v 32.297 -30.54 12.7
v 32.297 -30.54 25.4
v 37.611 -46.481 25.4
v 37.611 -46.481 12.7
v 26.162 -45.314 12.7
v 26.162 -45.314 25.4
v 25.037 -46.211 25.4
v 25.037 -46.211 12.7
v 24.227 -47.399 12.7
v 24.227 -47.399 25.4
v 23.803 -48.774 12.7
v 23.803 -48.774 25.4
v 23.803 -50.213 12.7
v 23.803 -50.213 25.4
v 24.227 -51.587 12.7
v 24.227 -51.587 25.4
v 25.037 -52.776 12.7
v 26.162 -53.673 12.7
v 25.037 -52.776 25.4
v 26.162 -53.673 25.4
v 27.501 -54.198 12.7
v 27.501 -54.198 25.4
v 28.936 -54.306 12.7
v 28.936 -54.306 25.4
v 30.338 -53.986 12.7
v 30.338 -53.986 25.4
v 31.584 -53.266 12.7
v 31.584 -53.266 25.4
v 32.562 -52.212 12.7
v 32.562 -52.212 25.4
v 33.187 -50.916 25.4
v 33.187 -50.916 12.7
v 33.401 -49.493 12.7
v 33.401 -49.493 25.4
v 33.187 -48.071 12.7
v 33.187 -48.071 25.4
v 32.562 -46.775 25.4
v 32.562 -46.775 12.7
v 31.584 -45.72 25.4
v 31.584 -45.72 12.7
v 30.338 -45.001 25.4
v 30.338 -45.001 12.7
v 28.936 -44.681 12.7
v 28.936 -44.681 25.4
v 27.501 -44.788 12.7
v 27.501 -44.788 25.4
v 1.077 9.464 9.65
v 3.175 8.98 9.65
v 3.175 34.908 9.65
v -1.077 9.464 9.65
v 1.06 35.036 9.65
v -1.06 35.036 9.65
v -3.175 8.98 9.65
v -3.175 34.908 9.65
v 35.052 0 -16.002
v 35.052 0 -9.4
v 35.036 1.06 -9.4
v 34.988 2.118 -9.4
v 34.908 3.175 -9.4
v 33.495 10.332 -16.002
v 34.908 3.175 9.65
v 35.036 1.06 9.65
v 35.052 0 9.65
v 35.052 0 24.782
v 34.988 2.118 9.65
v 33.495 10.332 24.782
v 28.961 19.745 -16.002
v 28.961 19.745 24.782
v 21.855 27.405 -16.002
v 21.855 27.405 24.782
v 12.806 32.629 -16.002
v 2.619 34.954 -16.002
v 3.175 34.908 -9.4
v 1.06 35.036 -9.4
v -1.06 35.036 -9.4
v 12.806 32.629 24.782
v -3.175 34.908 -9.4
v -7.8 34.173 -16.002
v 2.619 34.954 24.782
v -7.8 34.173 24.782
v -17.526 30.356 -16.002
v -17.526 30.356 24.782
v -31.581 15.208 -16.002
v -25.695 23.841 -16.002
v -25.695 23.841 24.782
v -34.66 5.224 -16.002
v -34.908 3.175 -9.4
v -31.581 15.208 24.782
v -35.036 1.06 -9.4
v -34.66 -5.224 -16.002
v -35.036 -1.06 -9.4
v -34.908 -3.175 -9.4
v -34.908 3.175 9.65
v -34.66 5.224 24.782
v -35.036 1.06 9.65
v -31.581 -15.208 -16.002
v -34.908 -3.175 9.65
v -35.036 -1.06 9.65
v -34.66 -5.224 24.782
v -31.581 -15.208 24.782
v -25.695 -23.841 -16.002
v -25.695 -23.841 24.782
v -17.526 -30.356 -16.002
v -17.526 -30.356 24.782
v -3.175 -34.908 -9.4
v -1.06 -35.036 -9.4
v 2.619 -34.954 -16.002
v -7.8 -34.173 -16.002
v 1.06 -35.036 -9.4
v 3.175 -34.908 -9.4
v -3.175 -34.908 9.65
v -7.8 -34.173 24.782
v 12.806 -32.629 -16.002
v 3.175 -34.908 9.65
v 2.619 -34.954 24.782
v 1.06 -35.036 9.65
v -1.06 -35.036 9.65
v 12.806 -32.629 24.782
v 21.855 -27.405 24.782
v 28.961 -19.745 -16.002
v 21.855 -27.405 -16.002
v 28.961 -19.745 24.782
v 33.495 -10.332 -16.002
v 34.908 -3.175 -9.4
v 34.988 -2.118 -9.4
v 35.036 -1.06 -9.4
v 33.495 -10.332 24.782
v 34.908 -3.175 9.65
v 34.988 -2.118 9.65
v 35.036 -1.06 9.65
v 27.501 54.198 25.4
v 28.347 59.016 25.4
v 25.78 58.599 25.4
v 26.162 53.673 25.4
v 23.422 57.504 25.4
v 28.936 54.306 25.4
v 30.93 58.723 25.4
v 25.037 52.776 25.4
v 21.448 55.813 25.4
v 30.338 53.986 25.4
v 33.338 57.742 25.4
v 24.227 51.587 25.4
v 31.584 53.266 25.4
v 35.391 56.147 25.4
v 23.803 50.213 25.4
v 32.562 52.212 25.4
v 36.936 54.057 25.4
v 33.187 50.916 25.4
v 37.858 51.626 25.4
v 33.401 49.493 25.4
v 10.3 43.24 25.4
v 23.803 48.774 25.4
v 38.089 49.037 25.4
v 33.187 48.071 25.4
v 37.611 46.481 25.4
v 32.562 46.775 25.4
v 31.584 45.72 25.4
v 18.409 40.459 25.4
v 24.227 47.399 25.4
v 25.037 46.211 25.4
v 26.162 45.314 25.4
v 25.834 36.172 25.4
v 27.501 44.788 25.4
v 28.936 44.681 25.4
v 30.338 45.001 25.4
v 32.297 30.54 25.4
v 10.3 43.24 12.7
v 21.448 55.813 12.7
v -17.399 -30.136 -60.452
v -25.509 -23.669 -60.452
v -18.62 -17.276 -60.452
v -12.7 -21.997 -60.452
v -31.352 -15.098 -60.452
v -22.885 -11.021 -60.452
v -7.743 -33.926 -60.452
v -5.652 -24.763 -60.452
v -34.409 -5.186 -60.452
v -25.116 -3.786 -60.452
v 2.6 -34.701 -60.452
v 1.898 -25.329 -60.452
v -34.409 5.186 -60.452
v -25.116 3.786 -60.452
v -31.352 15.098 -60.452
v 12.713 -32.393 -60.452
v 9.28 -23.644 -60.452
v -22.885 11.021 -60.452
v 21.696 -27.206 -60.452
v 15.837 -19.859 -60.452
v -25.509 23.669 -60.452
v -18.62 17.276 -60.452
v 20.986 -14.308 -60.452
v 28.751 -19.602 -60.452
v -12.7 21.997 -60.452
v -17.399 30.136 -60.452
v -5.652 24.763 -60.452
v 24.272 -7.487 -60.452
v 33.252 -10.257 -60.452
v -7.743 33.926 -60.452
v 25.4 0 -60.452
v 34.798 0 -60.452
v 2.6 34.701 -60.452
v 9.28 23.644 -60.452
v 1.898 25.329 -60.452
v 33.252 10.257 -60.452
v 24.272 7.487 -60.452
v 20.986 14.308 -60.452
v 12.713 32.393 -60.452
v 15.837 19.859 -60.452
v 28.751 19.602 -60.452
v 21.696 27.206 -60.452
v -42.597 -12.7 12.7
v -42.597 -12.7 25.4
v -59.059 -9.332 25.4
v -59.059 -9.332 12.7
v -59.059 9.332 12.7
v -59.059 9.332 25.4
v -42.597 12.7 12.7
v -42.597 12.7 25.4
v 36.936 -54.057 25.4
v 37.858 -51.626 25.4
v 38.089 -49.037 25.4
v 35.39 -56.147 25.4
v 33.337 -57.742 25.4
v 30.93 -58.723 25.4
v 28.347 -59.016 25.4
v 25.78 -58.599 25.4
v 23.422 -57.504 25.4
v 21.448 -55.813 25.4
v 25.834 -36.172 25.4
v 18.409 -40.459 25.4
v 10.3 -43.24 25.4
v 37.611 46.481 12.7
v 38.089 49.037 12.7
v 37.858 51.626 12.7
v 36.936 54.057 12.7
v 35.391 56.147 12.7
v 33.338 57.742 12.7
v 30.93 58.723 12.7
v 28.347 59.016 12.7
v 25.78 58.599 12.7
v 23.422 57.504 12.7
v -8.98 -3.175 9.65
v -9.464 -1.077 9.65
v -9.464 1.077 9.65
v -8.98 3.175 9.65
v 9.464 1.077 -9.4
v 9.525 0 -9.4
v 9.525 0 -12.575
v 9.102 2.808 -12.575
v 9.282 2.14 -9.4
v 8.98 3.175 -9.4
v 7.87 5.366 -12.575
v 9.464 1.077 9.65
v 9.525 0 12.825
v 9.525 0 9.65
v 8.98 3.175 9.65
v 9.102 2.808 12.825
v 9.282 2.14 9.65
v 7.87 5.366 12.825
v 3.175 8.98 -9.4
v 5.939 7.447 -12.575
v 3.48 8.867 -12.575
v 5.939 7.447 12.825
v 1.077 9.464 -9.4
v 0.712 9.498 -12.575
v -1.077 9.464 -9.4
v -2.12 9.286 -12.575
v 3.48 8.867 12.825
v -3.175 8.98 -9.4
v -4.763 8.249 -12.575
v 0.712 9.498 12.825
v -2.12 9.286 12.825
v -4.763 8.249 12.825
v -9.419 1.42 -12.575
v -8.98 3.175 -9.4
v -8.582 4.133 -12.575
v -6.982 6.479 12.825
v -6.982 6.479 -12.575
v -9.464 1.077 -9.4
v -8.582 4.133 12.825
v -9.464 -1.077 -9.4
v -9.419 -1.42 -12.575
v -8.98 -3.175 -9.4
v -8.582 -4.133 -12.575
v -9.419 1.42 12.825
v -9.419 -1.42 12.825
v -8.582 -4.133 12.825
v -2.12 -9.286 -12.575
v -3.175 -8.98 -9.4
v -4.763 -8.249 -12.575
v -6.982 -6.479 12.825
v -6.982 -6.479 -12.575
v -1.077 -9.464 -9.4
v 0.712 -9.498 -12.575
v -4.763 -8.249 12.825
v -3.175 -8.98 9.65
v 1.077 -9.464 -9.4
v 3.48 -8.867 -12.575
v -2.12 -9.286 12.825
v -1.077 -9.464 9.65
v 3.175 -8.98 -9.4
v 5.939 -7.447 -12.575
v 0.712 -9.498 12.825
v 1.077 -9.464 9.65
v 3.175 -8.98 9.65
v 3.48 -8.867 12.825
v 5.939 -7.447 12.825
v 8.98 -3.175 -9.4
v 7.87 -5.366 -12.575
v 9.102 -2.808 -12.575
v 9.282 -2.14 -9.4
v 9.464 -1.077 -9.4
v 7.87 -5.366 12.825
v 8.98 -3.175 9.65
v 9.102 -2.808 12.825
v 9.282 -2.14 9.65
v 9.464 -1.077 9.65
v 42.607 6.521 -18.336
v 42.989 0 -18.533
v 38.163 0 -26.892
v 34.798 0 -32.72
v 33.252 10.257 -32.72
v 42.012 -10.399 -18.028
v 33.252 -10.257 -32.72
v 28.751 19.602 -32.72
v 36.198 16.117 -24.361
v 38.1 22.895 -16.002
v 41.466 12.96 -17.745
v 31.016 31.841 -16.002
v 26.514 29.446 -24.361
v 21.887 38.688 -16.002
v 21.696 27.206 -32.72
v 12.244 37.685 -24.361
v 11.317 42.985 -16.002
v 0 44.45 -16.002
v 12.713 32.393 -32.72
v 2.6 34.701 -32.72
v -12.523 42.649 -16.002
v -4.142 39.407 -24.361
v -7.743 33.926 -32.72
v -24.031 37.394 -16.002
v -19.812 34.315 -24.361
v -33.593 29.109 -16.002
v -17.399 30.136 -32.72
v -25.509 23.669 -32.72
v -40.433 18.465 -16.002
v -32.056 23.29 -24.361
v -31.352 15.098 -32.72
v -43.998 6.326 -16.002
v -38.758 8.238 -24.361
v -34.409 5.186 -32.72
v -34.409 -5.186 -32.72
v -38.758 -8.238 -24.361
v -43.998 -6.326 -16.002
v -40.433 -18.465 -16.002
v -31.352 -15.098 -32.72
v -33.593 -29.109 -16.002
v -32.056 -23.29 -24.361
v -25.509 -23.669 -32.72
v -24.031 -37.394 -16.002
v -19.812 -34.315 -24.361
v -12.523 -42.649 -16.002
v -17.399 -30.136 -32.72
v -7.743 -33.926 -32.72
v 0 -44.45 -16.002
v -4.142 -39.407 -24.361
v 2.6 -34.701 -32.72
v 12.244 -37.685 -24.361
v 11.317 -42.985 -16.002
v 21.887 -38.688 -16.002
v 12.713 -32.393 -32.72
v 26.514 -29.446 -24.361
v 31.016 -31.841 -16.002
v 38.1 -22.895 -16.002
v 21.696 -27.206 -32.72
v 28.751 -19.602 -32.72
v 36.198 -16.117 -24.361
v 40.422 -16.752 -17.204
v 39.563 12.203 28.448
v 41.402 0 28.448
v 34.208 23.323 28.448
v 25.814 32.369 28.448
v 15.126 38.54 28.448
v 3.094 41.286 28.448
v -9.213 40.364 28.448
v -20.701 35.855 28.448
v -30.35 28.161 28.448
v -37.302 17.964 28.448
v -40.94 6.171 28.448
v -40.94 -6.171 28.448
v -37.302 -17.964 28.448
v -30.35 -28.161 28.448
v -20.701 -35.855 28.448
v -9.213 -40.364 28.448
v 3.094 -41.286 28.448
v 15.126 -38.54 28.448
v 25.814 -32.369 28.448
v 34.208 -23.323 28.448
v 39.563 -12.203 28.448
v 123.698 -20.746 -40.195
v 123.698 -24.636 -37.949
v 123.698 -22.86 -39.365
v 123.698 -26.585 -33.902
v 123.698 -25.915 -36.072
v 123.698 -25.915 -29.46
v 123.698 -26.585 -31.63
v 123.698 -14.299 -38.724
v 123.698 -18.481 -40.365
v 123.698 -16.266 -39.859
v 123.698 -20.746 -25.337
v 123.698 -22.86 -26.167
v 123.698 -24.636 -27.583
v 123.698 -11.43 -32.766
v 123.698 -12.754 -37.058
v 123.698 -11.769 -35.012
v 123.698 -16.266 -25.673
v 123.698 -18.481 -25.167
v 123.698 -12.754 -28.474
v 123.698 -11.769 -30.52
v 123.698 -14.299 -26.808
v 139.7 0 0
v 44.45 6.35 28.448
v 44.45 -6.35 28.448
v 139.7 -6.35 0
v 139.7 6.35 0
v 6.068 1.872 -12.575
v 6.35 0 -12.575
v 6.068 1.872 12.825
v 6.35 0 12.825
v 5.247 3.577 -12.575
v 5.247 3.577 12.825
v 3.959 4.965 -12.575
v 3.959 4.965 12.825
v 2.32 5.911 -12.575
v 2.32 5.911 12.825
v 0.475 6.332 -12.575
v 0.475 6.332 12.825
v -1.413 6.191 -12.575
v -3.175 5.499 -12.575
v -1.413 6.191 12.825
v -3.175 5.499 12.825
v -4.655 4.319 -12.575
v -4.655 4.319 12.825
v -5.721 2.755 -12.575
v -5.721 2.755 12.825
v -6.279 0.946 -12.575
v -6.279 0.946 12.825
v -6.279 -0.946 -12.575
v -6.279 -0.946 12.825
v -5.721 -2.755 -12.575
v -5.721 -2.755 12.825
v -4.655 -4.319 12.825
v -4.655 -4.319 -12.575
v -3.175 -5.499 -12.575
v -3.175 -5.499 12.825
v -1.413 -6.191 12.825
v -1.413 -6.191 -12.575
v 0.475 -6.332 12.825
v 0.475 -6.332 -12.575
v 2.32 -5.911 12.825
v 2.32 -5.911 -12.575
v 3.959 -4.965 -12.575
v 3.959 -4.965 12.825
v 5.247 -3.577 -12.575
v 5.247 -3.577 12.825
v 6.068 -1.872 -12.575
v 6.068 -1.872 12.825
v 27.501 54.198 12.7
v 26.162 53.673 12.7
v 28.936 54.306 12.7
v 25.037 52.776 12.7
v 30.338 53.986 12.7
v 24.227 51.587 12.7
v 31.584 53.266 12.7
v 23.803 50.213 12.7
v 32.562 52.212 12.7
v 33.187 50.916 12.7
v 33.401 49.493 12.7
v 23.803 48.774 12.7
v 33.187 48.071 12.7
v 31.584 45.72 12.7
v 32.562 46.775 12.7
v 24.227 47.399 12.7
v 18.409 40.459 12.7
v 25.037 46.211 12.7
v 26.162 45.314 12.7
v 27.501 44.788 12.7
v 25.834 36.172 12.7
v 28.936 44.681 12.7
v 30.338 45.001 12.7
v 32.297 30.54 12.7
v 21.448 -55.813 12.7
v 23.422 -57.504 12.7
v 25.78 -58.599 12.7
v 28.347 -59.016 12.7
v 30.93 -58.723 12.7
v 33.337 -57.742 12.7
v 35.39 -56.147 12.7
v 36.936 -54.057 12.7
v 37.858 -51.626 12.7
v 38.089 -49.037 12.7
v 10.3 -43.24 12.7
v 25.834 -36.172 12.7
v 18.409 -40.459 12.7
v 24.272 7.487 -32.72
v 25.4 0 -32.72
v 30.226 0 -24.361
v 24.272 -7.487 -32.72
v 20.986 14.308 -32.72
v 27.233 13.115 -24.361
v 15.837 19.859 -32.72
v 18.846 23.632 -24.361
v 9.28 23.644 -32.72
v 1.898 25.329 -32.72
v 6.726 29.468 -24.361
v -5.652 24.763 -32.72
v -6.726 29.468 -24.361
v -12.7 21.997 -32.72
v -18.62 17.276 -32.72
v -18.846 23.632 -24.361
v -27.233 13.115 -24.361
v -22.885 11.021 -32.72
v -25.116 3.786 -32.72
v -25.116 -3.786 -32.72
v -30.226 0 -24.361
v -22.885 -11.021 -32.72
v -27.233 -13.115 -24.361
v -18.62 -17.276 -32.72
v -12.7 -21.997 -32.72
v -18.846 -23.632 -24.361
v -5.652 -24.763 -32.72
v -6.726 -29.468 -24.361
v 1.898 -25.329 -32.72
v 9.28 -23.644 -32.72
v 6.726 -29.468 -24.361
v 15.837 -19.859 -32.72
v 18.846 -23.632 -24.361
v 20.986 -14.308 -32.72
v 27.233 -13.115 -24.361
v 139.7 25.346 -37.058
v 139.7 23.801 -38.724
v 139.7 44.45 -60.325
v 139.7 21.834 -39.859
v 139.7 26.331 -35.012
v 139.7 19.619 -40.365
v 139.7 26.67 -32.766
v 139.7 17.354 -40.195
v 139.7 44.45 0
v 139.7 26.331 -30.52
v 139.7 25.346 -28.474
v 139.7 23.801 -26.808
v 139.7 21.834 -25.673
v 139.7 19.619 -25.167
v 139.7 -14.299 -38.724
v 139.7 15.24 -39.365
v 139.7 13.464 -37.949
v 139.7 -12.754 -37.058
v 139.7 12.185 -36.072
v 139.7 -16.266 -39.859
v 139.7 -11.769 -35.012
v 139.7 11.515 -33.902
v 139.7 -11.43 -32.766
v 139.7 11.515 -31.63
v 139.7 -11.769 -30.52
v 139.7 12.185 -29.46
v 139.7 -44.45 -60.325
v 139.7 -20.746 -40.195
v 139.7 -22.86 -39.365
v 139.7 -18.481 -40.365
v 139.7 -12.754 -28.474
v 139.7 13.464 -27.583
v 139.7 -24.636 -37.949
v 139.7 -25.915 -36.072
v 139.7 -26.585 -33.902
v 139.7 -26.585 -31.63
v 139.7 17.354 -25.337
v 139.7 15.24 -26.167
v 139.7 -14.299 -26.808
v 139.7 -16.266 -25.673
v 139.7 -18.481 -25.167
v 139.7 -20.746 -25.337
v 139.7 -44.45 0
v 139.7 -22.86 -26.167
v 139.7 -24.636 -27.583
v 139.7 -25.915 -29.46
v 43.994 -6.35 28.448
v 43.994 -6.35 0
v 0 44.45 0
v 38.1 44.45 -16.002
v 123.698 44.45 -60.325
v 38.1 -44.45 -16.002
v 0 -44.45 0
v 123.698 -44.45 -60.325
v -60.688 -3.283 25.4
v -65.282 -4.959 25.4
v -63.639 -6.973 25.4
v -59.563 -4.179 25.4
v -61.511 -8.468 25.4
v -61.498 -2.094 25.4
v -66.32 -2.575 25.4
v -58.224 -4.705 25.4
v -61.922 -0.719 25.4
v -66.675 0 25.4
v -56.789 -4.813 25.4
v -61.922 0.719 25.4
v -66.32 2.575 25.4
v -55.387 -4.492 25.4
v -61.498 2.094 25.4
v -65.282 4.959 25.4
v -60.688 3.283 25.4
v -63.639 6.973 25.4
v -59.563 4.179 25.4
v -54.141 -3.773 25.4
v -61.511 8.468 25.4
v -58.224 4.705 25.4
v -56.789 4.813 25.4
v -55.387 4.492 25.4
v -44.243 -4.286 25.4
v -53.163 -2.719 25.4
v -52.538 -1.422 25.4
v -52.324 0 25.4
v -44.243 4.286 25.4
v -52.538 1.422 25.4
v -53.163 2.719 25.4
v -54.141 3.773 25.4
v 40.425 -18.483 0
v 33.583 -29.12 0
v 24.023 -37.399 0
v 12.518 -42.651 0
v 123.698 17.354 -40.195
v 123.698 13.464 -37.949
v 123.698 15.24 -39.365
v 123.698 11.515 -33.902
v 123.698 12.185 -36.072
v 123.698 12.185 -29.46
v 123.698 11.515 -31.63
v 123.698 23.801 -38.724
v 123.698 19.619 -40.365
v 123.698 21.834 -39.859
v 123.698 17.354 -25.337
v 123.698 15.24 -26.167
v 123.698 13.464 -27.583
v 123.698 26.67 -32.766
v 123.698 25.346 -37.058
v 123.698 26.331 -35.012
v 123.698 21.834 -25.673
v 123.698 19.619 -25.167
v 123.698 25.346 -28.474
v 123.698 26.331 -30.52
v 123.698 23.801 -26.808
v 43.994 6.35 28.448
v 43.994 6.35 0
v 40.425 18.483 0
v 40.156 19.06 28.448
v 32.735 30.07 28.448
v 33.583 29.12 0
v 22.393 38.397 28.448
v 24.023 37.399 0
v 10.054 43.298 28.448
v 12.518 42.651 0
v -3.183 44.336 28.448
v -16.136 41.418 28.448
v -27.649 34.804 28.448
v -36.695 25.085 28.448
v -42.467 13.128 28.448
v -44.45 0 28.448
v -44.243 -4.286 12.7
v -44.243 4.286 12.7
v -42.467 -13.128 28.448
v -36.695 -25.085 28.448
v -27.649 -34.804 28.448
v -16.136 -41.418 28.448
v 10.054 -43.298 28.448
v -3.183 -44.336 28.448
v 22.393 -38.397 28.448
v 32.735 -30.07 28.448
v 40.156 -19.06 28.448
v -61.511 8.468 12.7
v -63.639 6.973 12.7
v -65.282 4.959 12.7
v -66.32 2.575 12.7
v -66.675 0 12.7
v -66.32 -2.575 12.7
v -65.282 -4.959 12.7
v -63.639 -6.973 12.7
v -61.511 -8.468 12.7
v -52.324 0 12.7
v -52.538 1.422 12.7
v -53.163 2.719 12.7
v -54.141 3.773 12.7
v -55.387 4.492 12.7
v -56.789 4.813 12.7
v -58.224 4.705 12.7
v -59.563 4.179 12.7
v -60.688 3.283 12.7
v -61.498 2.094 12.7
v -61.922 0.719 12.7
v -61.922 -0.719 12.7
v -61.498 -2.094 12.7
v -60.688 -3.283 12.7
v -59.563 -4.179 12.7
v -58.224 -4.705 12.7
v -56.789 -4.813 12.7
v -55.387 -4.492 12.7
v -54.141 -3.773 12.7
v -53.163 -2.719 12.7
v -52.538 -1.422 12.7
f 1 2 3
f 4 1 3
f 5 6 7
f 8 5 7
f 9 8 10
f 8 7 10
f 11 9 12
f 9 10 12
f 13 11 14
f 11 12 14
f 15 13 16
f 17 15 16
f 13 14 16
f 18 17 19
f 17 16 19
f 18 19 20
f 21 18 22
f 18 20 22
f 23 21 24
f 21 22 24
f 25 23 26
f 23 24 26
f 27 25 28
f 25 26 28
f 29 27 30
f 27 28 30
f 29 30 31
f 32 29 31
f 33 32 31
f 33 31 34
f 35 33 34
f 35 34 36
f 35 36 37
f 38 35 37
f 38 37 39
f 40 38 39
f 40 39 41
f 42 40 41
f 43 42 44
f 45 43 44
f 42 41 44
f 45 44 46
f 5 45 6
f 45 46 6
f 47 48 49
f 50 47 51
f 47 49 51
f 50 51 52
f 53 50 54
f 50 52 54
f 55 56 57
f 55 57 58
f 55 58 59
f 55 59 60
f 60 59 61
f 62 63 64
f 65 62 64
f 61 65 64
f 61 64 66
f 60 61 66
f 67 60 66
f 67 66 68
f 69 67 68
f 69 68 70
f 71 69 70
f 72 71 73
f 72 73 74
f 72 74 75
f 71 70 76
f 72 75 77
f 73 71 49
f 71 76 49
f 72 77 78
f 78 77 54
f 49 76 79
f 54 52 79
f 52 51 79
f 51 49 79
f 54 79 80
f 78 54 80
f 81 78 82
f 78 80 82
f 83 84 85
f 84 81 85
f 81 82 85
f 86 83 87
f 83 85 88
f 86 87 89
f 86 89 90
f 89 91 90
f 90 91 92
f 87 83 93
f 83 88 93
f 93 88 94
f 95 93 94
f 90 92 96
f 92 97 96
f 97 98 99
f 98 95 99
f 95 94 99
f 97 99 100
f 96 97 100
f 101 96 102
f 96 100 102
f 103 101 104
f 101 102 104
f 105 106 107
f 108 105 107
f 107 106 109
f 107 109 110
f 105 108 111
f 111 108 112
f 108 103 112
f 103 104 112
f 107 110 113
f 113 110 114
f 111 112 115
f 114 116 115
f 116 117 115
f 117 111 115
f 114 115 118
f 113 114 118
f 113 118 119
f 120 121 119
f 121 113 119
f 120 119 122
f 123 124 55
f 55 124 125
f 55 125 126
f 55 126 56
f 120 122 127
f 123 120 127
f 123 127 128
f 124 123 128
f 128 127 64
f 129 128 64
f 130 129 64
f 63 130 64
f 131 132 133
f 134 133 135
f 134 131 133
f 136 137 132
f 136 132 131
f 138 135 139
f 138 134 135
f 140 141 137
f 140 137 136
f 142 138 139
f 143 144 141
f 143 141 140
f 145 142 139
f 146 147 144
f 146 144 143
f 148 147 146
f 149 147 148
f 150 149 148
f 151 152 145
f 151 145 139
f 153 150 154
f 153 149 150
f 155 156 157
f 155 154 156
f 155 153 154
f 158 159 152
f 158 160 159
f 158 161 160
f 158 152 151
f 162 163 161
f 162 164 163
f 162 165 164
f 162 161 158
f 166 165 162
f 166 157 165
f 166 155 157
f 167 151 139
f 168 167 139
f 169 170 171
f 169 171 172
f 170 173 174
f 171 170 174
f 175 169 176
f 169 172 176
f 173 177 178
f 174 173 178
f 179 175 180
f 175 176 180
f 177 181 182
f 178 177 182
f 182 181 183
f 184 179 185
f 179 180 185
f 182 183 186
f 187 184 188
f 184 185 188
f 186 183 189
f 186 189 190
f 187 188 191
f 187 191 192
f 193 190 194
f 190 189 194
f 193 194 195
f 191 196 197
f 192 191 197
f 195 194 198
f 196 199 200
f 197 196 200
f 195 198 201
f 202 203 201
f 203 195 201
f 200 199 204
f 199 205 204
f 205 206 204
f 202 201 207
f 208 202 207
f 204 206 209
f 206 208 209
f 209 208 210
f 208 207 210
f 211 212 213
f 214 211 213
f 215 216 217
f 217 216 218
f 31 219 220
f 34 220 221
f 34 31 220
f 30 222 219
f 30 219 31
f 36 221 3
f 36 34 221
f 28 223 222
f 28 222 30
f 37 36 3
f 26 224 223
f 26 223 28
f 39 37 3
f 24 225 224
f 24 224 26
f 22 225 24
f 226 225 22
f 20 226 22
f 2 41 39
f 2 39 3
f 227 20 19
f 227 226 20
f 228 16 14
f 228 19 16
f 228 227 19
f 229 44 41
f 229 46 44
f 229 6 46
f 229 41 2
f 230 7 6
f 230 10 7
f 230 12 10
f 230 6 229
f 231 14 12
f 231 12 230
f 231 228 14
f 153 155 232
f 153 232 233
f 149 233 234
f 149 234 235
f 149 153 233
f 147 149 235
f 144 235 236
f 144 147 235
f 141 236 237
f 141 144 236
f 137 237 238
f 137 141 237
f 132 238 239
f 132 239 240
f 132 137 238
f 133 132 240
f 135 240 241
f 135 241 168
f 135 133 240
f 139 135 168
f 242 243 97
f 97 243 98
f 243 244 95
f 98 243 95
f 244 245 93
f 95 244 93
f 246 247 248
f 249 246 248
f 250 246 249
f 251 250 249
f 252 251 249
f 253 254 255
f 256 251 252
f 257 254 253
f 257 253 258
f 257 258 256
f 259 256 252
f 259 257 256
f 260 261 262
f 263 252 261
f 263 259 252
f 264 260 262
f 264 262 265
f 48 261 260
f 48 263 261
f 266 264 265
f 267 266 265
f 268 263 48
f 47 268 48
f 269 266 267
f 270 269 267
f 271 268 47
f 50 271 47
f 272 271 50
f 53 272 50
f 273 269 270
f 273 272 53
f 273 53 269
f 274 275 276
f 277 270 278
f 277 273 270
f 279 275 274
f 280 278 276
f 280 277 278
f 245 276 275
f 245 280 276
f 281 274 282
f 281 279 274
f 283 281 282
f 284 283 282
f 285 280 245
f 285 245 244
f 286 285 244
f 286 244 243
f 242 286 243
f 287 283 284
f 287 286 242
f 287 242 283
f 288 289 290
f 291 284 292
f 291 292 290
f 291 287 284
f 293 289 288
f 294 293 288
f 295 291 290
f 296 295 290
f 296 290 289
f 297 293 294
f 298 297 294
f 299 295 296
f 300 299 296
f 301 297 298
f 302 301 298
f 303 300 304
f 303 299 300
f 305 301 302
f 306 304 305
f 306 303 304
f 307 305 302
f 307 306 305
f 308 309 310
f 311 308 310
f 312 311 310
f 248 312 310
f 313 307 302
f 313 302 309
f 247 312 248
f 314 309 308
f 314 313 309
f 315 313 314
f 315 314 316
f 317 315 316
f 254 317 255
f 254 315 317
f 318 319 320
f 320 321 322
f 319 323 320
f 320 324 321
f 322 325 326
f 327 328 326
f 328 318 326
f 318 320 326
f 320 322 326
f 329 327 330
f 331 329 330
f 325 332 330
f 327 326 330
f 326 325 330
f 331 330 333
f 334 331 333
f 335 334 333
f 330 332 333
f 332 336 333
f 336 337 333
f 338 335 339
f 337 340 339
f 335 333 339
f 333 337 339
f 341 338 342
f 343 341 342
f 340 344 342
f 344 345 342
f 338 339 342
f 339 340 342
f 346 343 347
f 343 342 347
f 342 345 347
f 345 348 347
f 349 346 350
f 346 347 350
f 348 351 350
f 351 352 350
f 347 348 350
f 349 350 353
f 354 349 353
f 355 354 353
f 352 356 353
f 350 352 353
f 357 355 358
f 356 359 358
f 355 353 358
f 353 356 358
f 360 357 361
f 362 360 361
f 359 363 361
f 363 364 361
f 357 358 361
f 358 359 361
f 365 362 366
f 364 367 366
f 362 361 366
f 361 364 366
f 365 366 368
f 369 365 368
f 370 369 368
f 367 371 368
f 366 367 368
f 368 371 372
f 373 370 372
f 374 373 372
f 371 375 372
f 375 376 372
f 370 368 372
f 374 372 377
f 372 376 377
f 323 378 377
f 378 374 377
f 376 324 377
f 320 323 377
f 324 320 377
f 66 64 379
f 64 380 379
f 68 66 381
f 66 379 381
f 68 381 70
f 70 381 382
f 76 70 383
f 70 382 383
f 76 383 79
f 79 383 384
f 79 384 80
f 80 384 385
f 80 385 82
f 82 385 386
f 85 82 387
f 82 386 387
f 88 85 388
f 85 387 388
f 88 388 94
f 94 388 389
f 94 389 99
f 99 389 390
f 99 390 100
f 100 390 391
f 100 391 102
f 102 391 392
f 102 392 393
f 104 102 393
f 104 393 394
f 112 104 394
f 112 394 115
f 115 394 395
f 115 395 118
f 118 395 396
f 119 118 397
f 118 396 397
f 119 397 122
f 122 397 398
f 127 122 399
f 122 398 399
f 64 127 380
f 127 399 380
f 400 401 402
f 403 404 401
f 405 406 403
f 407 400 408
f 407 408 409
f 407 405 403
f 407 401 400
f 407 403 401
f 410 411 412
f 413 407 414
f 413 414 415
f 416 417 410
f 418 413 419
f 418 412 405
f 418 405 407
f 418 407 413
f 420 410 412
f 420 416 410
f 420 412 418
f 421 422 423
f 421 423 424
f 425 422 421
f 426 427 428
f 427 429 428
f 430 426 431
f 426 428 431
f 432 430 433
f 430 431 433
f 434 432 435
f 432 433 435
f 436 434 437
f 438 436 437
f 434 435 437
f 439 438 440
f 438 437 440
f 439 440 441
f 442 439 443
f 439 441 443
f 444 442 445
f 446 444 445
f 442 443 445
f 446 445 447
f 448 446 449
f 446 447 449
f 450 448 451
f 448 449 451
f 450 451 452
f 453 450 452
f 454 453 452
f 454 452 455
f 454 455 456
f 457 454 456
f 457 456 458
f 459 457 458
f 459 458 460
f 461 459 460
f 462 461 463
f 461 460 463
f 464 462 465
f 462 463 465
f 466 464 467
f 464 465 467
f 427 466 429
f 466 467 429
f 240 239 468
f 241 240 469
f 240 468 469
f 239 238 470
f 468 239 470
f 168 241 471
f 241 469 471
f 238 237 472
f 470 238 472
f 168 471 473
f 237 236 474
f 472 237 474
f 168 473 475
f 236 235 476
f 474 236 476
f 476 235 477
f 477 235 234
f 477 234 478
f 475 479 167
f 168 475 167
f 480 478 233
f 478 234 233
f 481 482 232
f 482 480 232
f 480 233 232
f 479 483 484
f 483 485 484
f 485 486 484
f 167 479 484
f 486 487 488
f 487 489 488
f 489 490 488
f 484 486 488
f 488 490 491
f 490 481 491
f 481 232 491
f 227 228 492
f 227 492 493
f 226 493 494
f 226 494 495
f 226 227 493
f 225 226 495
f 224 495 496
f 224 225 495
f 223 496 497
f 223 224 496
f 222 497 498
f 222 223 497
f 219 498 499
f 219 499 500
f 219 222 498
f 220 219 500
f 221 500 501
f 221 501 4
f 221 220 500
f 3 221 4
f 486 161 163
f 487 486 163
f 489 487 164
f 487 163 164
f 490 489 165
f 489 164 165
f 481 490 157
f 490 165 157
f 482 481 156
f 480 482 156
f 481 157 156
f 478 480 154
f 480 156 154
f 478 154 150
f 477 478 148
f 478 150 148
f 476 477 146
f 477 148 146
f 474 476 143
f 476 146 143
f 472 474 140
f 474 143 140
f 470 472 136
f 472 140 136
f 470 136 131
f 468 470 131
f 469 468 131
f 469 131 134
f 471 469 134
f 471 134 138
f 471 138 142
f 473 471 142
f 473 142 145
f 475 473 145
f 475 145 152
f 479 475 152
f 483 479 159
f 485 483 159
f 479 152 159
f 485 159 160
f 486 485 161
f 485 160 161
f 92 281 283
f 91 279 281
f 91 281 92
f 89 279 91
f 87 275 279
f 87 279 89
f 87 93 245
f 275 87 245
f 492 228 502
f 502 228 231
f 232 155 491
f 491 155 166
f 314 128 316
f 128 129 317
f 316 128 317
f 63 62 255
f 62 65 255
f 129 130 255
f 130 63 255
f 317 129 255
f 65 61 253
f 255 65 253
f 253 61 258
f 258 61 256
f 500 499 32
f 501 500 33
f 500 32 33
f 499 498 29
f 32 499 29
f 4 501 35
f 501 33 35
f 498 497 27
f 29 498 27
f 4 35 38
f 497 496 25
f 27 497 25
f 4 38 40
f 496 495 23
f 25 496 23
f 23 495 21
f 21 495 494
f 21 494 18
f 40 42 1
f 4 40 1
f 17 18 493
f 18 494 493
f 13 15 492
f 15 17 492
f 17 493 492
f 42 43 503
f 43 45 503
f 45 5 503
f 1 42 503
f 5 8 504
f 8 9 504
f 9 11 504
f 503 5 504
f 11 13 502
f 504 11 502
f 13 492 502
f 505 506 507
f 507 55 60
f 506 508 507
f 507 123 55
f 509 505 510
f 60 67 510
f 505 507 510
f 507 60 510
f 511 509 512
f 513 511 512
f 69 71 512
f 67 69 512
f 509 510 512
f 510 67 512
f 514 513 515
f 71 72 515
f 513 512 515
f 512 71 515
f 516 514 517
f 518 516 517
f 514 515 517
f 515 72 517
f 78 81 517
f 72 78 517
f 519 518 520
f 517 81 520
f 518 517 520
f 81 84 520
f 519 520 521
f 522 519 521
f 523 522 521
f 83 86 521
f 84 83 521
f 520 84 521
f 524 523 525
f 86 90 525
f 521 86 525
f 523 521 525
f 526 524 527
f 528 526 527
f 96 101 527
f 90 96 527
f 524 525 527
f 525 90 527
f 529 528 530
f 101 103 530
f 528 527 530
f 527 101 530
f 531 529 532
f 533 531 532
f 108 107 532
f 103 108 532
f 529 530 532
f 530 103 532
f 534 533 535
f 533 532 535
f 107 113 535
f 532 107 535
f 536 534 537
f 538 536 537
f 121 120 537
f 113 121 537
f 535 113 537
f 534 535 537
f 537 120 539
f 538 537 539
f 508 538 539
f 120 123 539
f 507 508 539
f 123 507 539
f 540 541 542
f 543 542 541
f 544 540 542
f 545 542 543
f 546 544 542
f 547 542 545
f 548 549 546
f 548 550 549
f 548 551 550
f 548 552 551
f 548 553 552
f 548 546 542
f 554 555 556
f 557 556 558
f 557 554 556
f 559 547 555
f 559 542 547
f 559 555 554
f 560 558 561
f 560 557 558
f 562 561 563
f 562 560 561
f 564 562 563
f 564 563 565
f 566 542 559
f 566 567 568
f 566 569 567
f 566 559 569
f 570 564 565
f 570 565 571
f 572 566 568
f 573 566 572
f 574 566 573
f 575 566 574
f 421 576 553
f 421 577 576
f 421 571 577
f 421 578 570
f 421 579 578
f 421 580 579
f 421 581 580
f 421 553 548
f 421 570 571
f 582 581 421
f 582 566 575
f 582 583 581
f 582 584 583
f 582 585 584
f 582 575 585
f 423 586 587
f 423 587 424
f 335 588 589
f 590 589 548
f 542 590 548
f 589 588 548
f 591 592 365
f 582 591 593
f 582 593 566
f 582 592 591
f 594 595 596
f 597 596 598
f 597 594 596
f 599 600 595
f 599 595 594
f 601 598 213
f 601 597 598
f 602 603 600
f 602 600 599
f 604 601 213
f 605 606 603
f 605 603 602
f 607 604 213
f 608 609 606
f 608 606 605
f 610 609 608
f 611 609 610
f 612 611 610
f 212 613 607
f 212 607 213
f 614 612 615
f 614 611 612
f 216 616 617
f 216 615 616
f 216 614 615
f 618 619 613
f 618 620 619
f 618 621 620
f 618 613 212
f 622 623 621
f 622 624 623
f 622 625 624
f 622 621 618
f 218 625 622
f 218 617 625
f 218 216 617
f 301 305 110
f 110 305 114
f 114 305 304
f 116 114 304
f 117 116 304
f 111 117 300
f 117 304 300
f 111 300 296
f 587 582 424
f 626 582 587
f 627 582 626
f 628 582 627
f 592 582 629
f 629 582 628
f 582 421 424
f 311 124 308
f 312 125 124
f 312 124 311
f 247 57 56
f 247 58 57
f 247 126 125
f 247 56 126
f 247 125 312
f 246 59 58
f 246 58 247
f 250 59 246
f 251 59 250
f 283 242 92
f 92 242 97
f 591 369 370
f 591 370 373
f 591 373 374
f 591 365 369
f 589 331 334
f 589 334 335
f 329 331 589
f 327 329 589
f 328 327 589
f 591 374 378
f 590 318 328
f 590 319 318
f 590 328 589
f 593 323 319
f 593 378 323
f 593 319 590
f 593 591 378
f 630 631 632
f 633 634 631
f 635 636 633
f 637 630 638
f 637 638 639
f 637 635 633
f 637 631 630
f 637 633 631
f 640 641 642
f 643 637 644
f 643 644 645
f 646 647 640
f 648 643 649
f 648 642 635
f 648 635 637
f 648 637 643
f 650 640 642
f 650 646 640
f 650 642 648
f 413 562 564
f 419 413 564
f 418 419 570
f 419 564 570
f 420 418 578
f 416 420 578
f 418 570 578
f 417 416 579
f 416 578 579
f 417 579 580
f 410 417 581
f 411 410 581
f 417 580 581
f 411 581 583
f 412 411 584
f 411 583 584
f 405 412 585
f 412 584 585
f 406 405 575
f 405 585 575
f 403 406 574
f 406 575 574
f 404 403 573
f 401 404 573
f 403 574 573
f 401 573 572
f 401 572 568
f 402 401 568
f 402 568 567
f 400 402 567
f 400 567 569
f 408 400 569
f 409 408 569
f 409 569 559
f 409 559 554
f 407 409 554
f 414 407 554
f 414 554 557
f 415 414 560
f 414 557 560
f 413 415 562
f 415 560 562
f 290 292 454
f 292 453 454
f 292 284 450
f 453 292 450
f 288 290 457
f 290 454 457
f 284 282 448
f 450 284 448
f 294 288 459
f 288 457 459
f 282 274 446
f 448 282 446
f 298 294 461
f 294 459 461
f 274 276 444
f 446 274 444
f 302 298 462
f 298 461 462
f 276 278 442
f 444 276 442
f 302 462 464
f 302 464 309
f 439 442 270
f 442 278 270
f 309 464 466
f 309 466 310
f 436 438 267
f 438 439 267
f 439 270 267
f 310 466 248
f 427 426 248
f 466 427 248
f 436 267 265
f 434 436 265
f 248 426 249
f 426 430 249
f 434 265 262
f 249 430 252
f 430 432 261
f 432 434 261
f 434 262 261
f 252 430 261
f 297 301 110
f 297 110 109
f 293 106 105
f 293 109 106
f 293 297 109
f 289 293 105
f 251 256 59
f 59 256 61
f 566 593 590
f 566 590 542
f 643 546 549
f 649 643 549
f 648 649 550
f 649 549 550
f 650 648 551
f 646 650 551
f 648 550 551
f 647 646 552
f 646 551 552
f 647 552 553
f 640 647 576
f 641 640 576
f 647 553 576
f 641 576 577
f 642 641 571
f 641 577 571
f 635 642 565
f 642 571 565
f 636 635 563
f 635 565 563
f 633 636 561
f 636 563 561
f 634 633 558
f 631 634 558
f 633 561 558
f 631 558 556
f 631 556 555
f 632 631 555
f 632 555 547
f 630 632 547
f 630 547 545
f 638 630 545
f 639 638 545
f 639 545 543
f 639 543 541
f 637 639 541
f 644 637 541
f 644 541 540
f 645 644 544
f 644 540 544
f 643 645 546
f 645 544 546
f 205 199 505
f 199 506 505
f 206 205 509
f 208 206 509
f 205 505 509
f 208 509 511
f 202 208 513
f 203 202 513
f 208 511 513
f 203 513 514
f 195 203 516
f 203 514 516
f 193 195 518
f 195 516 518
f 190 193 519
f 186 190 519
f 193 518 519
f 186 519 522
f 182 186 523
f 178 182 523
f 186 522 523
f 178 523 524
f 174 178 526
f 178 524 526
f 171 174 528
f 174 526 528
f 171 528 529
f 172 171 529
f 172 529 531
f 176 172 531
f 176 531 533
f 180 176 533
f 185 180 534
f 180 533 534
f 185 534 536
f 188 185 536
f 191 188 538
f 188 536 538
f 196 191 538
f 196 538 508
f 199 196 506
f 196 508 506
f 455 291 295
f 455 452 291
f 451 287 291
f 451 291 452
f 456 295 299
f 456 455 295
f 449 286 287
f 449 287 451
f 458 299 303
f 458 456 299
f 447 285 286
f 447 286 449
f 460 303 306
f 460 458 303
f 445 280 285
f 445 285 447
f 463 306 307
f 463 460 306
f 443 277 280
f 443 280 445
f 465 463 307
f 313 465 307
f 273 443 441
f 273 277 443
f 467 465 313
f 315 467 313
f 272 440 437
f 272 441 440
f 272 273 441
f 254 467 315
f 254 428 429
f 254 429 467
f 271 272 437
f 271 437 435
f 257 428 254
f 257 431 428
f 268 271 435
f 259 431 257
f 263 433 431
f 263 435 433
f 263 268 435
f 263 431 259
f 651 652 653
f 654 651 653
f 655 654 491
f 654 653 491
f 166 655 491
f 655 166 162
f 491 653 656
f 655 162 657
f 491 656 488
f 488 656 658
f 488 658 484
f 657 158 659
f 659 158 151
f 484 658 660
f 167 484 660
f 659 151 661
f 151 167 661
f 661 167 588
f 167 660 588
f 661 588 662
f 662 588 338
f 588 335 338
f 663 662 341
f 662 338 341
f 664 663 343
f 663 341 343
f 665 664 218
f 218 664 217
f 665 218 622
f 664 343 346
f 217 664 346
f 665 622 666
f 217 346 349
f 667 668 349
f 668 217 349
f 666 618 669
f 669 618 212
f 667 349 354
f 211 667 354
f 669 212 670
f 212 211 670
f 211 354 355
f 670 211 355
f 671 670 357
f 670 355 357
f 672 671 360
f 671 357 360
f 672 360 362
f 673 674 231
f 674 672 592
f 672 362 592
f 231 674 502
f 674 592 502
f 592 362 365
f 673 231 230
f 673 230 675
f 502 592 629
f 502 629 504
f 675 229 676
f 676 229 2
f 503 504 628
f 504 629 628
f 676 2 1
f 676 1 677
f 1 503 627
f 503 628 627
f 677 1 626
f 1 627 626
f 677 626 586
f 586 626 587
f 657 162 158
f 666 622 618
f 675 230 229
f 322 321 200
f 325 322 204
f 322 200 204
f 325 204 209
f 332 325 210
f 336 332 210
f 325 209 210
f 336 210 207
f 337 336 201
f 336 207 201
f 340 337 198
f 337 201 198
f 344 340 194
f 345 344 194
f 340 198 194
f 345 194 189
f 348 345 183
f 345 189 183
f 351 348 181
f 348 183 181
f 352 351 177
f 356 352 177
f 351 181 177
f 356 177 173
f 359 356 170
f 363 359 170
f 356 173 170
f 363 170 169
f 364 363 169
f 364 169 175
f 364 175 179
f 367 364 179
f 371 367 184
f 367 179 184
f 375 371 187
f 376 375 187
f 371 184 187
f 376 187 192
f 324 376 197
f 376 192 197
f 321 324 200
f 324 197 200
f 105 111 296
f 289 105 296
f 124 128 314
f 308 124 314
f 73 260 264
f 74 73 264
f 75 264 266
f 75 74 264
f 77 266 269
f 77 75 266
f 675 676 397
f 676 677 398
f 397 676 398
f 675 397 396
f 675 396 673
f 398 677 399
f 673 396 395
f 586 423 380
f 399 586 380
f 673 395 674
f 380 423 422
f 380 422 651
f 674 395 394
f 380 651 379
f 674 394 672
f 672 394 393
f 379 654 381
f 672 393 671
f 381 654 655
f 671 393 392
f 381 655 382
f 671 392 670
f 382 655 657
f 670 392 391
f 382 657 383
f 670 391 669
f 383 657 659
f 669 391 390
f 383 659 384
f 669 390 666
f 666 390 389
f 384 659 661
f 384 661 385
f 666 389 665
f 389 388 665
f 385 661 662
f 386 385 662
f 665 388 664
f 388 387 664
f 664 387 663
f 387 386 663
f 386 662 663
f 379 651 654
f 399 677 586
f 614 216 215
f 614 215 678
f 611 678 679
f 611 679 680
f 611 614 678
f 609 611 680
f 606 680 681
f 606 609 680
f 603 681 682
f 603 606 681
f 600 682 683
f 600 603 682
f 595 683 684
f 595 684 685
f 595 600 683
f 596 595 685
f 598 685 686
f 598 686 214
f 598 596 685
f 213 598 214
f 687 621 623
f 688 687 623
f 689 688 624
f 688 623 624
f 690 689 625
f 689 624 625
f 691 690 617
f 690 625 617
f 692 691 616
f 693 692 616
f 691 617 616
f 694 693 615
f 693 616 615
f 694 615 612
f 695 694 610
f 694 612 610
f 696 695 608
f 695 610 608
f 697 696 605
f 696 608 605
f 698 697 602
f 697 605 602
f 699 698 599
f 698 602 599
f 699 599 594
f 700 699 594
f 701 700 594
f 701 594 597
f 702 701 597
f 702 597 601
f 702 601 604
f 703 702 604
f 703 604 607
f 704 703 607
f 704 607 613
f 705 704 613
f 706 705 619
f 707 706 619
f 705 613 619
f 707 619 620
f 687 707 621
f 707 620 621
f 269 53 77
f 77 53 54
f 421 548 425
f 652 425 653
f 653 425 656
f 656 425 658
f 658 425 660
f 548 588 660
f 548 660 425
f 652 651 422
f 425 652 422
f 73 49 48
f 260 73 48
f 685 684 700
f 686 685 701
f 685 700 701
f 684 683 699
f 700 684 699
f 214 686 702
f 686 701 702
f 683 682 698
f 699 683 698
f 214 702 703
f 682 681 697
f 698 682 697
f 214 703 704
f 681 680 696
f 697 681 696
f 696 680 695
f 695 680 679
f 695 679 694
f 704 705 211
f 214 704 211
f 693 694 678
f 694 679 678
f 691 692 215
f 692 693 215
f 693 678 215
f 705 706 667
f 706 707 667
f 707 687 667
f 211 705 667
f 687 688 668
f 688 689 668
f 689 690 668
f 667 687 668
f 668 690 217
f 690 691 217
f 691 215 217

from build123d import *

# Parameters (mm, degrees)
PAD_DEPTH            = 44.45
SKETCH002_R          = 35.052
POCKET_DEPTH         = 16.002
SKETCH003_R          = 4.826
PAD001_DEPTH         = 12.7
POLARPATTERN_COUNT   = 3
PAD002_DEPTH         = 9.525
SKETCH005_R          = 9.525
PAD003_DEPTH         = 12.7
SKETCH006_R          = 6.35
POCKET001_DEPTH      = 12.7
SKETCH007_W          = 95.705909
SKETCH007_H          = 12.7
PAD004_DEPTH         = 28.448
POCKET002_DEPTH      = 59.019352
POCKET002_DEPTH_BACK = -59.019352
SKETCH009_R          = 7.62
POCKET003_DEPTH      = 16.002


with BuildPart() as part:
    # Sketch → Pad (new body, symmetric)
    with BuildSketch(Plane.XZ):
        Polygon((38.1, -16.002), (123.698, -60.325), (139.7, -60.325), (139.7, 0), (38.1, 0), (0, 0), (0, -16.002), align=None)
    extrude(amount=PAD_DEPTH, both=True)

    # Sketch001 → Revolution (revolve)
    with BuildSketch(Plane.XZ):
        Polygon((44.45, 28.448), (44.45, -16.002), (34.798, -32.719754), (34.798, -60.452), (25.4, -60.452), (25.4, -32.719754), (35.052, -16.002), (35.052, 24.781826), (41.402, 28.448), align=None)
    revolve(axis=Axis((0, 0, 0), (0, 0, 1)))

    # Sketch002 → Pocket (cut)
    with BuildSketch(Plane.XY):
        Circle(SKETCH002_R)
    extrude(amount=-POCKET_DEPTH, mode=Mode.SUBTRACT)

    # Sketch003 (on DatumPlane) → Pad001 (join)
    with BuildSketch(Plane.XY.offset(25.4)):
        with BuildLine():
            ThreePointArc((-59.059347, 9.331667), (-66.675, 1.8e-05), (-59.059383, -9.33166))
            Line((-42.597095, -12.7), (-59.059383, -9.33166))
            Line((-42.597095, 12.7), (-42.597095, -12.7))
            Line((-59.059347, 9.331667), (-42.597095, 12.7))
        make_face()
        with Locations((-57.15, 0)):
            Circle(SKETCH003_R, mode=Mode.SUBTRACT)
    pad001 = extrude(amount=-PAD001_DEPTH)

    # PolarPattern: Pad001 ×3 about axis
    polarpattern_axis = Axis((0, 0, 25.4), (0, 0, 1))
    for i in range(1, POLARPATTERN_COUNT):
        add(pad001.rotate(polarpattern_axis, i * 360 / POLARPATTERN_COUNT))

    # Sketch004 (on DatumPlane) → Pad002 (join, symmetric)
    with BuildSketch(Plane.XY.offset(0.125)):
        Polygon((-35.052, 3.175), (-3.175, 3.175), (-3.175, 35.052), (3.175, 35.052), (3.175, 3.175), (35.052, 3.175), (35.052, -3.175), (3.175, -3.175), (3.175, -35.052), (-3.175, -35.052), (-3.175, -3.175), (-35.052, -3.175), align=None)
    extrude(amount=PAD002_DEPTH, both=True)

    # Sketch005 (on DatumPlane) → Pad003 (join, symmetric)
    with BuildSketch(Plane.XY.offset(0.125)):
        Circle(SKETCH005_R)
    extrude(amount=PAD003_DEPTH, both=True)

    # Sketch006 (on DatumPlane) → Pocket001 (cut, symmetric)
    with BuildSketch(Plane.XY.offset(0.125)):
        Circle(SKETCH006_R)
    extrude(amount=POCKET001_DEPTH, both=True, mode=Mode.SUBTRACT)

    # Sketch007 → Pad004 (join)
    with BuildSketch(Plane.XY):
        with Locations((91.847045, 0)):
            Rectangle(SKETCH007_W, SKETCH007_H)
    extrude(amount=PAD004_DEPTH)

    # Sketch008 → Pocket002 (cut, two sides)
    with BuildSketch(Plane.XZ) as pocket002_sk:
        Polygon((44.45, 28.448), (139.7, 0), (139.7, 28.448), align=None)
    extrude(amount=-POCKET002_DEPTH, mode=Mode.SUBTRACT)
    extrude(pocket002_sk.sketch, amount=-POCKET002_DEPTH_BACK, mode=Mode.SUBTRACT)

    # Sketch009 (on DatumPlane) → Pocket003 (cut)
    with BuildSketch(Plane.YZ.offset(139.7)):
        with Locations((-19.05, -32.766)):
            Circle(SKETCH009_R)
        with Locations((19.05, -32.766)):
            Circle(SKETCH009_R)
    extrude(amount=-POCKET003_DEPTH, mode=Mode.SUBTRACT)


solid = part.part
